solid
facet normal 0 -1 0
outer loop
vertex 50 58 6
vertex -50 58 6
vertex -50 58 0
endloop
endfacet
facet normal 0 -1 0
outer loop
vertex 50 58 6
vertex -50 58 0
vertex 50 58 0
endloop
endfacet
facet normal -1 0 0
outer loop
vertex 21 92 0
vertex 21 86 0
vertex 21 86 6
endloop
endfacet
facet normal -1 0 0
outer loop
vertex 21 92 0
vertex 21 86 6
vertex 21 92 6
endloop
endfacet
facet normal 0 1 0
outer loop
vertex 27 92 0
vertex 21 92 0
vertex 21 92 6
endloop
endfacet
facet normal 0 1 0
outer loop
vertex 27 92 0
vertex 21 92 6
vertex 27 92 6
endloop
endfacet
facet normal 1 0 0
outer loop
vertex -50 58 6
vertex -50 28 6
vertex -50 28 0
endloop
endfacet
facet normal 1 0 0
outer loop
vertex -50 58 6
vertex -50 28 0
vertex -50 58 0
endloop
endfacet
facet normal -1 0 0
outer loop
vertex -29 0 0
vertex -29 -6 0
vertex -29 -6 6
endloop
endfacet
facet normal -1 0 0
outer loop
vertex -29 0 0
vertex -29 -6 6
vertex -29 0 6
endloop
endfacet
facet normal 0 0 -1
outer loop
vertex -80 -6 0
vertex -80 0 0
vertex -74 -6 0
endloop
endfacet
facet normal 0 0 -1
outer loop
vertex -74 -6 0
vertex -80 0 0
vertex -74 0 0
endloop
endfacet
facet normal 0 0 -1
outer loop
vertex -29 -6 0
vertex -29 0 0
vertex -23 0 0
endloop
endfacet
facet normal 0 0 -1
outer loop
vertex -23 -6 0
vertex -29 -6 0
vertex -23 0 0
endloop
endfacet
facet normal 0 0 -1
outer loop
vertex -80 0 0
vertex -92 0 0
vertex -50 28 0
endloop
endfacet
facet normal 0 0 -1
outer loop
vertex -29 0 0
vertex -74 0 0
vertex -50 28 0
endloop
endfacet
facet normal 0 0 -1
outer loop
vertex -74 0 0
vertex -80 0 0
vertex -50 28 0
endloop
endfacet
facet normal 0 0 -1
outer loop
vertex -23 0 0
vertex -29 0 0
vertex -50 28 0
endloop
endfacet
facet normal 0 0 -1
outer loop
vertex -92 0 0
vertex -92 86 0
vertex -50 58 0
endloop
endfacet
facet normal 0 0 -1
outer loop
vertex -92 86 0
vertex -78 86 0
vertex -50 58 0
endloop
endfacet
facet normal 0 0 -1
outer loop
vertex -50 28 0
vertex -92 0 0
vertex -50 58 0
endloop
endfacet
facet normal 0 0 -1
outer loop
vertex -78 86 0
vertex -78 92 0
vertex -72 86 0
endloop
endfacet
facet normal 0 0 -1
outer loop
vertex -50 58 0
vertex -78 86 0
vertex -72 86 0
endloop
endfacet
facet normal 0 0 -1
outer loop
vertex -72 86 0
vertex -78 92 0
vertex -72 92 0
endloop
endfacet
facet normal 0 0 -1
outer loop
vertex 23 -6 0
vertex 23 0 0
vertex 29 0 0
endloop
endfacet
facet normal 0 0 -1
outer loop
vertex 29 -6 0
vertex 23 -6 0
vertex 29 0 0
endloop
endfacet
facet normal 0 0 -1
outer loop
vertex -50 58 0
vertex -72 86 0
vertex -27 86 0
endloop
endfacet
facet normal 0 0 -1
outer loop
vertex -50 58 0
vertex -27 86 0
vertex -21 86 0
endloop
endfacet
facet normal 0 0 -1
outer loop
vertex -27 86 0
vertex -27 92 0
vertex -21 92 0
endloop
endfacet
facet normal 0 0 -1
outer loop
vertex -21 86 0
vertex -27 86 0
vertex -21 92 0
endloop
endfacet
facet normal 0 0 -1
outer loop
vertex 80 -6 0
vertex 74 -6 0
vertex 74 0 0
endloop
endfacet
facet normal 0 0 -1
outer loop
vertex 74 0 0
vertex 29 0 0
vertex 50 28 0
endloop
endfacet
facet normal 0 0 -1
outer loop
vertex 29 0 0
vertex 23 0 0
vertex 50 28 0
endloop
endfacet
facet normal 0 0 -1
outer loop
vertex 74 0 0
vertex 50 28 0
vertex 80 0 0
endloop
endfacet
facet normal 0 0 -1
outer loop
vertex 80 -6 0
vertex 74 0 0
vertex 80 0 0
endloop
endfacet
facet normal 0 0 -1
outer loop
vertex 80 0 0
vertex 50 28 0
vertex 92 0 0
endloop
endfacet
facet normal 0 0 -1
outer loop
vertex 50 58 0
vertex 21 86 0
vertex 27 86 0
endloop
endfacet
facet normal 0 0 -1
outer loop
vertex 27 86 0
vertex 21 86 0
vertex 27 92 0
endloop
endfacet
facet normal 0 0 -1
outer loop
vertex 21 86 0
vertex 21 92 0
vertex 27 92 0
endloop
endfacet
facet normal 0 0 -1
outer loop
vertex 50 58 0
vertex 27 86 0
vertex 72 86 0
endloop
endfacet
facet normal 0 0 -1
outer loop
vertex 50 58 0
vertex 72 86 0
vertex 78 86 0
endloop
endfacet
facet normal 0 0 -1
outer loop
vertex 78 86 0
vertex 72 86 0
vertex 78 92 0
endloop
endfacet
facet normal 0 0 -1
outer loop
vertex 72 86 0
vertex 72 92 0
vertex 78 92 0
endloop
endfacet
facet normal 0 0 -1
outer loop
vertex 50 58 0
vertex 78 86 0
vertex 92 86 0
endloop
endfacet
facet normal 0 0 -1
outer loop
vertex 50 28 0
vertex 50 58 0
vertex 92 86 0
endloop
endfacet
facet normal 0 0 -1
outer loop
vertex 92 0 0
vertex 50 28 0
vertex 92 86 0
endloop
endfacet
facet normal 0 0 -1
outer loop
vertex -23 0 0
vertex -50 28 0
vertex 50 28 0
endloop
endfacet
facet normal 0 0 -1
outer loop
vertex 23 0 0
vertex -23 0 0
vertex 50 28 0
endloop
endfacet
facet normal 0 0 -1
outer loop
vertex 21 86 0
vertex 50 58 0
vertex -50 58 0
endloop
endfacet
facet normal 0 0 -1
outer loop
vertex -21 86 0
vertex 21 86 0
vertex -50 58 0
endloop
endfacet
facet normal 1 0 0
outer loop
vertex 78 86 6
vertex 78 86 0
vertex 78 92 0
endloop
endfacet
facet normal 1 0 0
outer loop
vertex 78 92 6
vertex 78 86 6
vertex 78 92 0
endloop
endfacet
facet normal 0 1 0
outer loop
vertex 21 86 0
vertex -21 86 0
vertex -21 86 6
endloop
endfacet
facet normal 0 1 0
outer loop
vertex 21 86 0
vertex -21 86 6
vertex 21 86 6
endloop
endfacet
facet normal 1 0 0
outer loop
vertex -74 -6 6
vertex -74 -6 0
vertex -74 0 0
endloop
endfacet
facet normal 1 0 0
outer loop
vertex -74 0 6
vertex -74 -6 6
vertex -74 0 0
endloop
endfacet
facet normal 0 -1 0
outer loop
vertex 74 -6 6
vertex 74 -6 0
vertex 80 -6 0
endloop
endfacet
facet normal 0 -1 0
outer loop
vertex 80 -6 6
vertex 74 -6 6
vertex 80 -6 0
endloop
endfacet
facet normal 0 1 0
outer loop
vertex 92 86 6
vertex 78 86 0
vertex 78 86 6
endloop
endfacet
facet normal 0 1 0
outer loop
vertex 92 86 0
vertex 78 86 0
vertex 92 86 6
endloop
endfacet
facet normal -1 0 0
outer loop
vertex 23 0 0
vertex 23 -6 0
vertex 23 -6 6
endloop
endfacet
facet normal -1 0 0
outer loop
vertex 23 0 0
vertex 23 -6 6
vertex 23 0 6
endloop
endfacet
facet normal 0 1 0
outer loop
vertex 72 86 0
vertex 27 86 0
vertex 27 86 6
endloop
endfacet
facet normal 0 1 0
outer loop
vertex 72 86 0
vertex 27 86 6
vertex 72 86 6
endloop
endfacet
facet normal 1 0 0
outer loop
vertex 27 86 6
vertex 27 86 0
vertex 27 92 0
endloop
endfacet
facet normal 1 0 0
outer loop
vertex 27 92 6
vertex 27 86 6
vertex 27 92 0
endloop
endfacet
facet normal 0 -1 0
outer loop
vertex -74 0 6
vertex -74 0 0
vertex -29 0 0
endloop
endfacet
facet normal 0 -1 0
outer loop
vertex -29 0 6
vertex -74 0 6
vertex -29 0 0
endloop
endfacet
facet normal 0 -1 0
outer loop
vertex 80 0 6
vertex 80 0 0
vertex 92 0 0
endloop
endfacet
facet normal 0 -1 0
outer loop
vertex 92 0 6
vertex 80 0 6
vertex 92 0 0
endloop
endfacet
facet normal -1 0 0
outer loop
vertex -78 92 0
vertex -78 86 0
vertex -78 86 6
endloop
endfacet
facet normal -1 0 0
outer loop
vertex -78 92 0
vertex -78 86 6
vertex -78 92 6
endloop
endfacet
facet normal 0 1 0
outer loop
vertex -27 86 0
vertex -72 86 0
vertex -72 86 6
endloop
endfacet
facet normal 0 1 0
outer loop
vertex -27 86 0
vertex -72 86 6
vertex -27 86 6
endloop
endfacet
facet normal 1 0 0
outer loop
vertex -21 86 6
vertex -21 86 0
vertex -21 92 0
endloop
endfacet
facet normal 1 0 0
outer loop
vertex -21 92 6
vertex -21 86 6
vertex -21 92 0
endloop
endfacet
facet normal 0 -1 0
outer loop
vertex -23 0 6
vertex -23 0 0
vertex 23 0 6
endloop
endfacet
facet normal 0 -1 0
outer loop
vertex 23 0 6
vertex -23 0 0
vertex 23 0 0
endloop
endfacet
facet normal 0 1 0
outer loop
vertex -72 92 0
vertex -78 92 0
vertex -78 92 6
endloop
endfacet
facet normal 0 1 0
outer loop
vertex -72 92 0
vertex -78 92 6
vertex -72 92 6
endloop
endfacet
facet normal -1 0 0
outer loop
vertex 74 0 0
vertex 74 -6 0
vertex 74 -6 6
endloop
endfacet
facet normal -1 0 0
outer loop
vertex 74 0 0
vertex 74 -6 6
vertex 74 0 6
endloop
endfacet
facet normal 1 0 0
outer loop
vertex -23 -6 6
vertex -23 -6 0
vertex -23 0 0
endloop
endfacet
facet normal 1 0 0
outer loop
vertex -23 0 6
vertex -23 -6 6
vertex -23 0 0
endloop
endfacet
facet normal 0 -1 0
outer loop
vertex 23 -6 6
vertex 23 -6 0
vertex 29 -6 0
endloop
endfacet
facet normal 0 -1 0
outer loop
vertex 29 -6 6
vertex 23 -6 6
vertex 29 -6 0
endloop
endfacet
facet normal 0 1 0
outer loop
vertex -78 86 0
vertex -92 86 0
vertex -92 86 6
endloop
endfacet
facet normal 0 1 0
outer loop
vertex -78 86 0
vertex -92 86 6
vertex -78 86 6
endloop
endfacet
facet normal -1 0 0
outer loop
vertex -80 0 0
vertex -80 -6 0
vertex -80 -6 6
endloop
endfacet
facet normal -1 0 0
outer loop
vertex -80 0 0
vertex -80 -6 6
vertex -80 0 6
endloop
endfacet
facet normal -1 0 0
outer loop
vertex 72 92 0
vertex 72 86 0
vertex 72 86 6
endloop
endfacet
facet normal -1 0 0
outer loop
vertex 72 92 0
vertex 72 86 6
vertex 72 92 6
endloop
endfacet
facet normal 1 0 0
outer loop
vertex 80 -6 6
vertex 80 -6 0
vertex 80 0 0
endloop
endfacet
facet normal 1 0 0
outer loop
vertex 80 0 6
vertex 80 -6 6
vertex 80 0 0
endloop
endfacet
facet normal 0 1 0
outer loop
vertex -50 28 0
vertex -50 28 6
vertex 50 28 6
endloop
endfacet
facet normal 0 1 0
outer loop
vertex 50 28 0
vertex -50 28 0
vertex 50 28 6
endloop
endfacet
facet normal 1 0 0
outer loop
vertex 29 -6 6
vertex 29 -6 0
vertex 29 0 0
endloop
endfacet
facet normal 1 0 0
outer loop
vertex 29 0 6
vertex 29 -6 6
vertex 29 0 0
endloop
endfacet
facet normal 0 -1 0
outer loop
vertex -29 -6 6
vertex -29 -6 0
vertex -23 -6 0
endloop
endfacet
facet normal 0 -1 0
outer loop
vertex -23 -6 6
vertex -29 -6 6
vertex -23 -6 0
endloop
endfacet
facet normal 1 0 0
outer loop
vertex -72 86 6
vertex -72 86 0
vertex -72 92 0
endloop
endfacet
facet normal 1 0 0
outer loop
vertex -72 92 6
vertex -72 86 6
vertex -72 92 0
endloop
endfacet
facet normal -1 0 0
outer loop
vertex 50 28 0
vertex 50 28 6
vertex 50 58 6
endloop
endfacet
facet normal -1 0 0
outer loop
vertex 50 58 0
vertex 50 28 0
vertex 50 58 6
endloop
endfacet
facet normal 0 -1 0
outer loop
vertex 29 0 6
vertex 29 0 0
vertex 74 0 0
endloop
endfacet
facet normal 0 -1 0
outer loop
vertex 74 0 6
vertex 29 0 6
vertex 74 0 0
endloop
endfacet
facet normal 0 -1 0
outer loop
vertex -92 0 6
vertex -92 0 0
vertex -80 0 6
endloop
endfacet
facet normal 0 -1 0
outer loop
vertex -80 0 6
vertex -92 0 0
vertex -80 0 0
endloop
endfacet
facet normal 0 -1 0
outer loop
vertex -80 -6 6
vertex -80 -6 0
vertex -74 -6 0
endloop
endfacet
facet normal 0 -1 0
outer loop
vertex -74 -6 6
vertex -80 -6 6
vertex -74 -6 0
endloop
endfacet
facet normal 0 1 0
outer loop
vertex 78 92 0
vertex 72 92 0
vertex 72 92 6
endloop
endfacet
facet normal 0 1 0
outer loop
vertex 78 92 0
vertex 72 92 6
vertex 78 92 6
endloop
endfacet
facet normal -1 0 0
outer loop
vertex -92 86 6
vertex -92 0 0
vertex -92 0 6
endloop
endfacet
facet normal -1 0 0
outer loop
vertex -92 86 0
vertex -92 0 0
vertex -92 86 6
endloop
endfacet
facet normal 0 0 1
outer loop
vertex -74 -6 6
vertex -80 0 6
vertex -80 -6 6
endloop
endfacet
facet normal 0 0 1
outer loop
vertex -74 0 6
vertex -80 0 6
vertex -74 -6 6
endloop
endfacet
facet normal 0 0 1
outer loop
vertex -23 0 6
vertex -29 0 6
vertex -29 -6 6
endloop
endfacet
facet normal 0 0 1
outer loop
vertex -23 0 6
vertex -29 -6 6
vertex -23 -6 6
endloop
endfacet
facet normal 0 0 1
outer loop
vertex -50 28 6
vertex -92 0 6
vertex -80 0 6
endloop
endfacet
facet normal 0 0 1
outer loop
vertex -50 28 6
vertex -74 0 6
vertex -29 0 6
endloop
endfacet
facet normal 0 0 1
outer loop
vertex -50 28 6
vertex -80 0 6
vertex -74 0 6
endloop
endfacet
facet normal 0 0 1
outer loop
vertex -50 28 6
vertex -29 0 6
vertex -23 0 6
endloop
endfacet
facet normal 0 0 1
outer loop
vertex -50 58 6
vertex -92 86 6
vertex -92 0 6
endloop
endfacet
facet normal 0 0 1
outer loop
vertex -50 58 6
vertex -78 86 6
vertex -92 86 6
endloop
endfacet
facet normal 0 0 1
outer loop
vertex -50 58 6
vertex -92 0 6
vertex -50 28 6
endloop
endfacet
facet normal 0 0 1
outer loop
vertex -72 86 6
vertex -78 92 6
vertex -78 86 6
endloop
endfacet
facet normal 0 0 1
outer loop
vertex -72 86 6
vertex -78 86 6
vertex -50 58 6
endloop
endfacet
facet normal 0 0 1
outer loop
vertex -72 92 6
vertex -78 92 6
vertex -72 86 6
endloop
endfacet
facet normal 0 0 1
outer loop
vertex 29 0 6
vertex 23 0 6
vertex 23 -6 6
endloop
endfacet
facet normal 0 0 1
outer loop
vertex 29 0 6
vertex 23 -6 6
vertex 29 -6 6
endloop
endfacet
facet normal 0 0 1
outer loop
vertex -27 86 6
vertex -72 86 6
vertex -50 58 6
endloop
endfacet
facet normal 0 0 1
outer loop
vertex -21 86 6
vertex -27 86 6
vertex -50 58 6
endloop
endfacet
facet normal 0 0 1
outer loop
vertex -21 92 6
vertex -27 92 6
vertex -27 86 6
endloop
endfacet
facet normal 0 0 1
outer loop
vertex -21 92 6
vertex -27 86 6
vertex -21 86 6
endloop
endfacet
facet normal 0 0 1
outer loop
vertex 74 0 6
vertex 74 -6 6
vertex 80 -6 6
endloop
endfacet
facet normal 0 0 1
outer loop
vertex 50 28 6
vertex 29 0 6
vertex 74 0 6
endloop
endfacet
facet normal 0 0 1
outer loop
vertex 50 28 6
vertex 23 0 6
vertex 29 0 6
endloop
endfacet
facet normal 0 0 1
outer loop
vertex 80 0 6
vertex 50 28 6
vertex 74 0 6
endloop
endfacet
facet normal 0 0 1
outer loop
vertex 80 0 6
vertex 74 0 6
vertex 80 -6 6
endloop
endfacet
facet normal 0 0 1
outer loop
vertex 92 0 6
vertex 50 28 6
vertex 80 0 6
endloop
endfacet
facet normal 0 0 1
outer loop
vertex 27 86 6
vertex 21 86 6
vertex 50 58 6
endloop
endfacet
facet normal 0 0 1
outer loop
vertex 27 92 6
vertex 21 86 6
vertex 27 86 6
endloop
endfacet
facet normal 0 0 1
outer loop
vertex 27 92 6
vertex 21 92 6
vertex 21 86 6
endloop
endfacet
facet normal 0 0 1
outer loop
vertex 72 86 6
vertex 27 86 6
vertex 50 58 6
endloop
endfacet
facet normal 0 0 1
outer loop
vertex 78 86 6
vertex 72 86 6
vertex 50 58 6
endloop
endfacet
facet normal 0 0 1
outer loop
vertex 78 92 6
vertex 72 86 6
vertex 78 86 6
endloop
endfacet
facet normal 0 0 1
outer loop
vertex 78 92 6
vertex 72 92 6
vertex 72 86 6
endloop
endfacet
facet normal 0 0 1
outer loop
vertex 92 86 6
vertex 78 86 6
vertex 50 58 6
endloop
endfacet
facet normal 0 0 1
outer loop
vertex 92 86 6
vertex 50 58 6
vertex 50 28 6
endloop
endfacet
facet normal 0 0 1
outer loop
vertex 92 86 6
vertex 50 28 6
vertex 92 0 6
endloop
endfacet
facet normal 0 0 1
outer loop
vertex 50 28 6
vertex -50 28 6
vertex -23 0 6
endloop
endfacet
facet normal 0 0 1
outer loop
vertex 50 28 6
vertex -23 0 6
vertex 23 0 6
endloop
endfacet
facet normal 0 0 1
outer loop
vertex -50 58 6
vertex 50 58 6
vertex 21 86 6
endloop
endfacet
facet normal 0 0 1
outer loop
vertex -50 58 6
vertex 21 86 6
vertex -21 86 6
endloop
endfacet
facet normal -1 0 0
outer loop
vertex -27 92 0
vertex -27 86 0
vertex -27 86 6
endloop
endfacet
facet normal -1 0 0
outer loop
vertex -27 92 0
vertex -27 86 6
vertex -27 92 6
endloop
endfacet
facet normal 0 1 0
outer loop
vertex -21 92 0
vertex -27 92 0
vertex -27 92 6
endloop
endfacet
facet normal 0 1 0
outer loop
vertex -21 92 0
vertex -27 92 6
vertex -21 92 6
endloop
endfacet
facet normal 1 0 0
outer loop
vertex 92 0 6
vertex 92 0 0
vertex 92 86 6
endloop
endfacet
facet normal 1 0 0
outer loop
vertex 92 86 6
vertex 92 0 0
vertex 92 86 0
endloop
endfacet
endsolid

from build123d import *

# Parameters (mm, degrees)
SKETCH1_W           = 184
SKETCH1_H           = 86
BOSS_EXTRUDE1_DEPTH = 6
SKETCH2_W           = 6
SKETCH2_H           = 6
BOSS_EXTRUDE2_DEPTH = 6
SKETCH3_W           = 100
SKETCH3_H           = 30
CUT_EXTRUDE1_DEPTH  = 6


with BuildPart() as part:
    # Sketch1 → Boss-Extrude1 (new body)
    with BuildSketch(Plane.XY):
        with Locations((0, 43)):
            Rectangle(SKETCH1_W, SKETCH1_H)
    extrude(amount=BOSS_EXTRUDE1_DEPTH)

    # Sketch2 → Boss-Extrude2 (add)
    with BuildSketch(Plane.XY):
        with Locations((-77, -3)):
            Rectangle(SKETCH2_W, SKETCH2_H)
        with Locations((-26, -3)):
            Rectangle(SKETCH2_W, SKETCH2_H)
        with Locations((26, -3)):
            Rectangle(SKETCH2_W, SKETCH2_H)
        with Locations((77, -3)):
            Rectangle(SKETCH2_W, SKETCH2_H)
        with Locations((-75, 89)):
            Rectangle(SKETCH2_W, SKETCH2_H)
        with Locations((-24, 89)):
            Rectangle(SKETCH2_W, SKETCH2_H)
        with Locations((24, 89)):
            Rectangle(SKETCH2_W, SKETCH2_H)
        with Locations((75, 89)):
            Rectangle(SKETCH2_W, SKETCH2_H)
    extrude(amount=BOSS_EXTRUDE2_DEPTH)

    # Sketch3 → Cut-Extrude1 (cut)
    with BuildSketch(Plane.XY.offset(6)):
        with Locations((0, 43)):
            Rectangle(SKETCH3_W, SKETCH3_H)
    extrude(amount=-CUT_EXTRUDE1_DEPTH, mode=Mode.SUBTRACT)


solid = part.part
